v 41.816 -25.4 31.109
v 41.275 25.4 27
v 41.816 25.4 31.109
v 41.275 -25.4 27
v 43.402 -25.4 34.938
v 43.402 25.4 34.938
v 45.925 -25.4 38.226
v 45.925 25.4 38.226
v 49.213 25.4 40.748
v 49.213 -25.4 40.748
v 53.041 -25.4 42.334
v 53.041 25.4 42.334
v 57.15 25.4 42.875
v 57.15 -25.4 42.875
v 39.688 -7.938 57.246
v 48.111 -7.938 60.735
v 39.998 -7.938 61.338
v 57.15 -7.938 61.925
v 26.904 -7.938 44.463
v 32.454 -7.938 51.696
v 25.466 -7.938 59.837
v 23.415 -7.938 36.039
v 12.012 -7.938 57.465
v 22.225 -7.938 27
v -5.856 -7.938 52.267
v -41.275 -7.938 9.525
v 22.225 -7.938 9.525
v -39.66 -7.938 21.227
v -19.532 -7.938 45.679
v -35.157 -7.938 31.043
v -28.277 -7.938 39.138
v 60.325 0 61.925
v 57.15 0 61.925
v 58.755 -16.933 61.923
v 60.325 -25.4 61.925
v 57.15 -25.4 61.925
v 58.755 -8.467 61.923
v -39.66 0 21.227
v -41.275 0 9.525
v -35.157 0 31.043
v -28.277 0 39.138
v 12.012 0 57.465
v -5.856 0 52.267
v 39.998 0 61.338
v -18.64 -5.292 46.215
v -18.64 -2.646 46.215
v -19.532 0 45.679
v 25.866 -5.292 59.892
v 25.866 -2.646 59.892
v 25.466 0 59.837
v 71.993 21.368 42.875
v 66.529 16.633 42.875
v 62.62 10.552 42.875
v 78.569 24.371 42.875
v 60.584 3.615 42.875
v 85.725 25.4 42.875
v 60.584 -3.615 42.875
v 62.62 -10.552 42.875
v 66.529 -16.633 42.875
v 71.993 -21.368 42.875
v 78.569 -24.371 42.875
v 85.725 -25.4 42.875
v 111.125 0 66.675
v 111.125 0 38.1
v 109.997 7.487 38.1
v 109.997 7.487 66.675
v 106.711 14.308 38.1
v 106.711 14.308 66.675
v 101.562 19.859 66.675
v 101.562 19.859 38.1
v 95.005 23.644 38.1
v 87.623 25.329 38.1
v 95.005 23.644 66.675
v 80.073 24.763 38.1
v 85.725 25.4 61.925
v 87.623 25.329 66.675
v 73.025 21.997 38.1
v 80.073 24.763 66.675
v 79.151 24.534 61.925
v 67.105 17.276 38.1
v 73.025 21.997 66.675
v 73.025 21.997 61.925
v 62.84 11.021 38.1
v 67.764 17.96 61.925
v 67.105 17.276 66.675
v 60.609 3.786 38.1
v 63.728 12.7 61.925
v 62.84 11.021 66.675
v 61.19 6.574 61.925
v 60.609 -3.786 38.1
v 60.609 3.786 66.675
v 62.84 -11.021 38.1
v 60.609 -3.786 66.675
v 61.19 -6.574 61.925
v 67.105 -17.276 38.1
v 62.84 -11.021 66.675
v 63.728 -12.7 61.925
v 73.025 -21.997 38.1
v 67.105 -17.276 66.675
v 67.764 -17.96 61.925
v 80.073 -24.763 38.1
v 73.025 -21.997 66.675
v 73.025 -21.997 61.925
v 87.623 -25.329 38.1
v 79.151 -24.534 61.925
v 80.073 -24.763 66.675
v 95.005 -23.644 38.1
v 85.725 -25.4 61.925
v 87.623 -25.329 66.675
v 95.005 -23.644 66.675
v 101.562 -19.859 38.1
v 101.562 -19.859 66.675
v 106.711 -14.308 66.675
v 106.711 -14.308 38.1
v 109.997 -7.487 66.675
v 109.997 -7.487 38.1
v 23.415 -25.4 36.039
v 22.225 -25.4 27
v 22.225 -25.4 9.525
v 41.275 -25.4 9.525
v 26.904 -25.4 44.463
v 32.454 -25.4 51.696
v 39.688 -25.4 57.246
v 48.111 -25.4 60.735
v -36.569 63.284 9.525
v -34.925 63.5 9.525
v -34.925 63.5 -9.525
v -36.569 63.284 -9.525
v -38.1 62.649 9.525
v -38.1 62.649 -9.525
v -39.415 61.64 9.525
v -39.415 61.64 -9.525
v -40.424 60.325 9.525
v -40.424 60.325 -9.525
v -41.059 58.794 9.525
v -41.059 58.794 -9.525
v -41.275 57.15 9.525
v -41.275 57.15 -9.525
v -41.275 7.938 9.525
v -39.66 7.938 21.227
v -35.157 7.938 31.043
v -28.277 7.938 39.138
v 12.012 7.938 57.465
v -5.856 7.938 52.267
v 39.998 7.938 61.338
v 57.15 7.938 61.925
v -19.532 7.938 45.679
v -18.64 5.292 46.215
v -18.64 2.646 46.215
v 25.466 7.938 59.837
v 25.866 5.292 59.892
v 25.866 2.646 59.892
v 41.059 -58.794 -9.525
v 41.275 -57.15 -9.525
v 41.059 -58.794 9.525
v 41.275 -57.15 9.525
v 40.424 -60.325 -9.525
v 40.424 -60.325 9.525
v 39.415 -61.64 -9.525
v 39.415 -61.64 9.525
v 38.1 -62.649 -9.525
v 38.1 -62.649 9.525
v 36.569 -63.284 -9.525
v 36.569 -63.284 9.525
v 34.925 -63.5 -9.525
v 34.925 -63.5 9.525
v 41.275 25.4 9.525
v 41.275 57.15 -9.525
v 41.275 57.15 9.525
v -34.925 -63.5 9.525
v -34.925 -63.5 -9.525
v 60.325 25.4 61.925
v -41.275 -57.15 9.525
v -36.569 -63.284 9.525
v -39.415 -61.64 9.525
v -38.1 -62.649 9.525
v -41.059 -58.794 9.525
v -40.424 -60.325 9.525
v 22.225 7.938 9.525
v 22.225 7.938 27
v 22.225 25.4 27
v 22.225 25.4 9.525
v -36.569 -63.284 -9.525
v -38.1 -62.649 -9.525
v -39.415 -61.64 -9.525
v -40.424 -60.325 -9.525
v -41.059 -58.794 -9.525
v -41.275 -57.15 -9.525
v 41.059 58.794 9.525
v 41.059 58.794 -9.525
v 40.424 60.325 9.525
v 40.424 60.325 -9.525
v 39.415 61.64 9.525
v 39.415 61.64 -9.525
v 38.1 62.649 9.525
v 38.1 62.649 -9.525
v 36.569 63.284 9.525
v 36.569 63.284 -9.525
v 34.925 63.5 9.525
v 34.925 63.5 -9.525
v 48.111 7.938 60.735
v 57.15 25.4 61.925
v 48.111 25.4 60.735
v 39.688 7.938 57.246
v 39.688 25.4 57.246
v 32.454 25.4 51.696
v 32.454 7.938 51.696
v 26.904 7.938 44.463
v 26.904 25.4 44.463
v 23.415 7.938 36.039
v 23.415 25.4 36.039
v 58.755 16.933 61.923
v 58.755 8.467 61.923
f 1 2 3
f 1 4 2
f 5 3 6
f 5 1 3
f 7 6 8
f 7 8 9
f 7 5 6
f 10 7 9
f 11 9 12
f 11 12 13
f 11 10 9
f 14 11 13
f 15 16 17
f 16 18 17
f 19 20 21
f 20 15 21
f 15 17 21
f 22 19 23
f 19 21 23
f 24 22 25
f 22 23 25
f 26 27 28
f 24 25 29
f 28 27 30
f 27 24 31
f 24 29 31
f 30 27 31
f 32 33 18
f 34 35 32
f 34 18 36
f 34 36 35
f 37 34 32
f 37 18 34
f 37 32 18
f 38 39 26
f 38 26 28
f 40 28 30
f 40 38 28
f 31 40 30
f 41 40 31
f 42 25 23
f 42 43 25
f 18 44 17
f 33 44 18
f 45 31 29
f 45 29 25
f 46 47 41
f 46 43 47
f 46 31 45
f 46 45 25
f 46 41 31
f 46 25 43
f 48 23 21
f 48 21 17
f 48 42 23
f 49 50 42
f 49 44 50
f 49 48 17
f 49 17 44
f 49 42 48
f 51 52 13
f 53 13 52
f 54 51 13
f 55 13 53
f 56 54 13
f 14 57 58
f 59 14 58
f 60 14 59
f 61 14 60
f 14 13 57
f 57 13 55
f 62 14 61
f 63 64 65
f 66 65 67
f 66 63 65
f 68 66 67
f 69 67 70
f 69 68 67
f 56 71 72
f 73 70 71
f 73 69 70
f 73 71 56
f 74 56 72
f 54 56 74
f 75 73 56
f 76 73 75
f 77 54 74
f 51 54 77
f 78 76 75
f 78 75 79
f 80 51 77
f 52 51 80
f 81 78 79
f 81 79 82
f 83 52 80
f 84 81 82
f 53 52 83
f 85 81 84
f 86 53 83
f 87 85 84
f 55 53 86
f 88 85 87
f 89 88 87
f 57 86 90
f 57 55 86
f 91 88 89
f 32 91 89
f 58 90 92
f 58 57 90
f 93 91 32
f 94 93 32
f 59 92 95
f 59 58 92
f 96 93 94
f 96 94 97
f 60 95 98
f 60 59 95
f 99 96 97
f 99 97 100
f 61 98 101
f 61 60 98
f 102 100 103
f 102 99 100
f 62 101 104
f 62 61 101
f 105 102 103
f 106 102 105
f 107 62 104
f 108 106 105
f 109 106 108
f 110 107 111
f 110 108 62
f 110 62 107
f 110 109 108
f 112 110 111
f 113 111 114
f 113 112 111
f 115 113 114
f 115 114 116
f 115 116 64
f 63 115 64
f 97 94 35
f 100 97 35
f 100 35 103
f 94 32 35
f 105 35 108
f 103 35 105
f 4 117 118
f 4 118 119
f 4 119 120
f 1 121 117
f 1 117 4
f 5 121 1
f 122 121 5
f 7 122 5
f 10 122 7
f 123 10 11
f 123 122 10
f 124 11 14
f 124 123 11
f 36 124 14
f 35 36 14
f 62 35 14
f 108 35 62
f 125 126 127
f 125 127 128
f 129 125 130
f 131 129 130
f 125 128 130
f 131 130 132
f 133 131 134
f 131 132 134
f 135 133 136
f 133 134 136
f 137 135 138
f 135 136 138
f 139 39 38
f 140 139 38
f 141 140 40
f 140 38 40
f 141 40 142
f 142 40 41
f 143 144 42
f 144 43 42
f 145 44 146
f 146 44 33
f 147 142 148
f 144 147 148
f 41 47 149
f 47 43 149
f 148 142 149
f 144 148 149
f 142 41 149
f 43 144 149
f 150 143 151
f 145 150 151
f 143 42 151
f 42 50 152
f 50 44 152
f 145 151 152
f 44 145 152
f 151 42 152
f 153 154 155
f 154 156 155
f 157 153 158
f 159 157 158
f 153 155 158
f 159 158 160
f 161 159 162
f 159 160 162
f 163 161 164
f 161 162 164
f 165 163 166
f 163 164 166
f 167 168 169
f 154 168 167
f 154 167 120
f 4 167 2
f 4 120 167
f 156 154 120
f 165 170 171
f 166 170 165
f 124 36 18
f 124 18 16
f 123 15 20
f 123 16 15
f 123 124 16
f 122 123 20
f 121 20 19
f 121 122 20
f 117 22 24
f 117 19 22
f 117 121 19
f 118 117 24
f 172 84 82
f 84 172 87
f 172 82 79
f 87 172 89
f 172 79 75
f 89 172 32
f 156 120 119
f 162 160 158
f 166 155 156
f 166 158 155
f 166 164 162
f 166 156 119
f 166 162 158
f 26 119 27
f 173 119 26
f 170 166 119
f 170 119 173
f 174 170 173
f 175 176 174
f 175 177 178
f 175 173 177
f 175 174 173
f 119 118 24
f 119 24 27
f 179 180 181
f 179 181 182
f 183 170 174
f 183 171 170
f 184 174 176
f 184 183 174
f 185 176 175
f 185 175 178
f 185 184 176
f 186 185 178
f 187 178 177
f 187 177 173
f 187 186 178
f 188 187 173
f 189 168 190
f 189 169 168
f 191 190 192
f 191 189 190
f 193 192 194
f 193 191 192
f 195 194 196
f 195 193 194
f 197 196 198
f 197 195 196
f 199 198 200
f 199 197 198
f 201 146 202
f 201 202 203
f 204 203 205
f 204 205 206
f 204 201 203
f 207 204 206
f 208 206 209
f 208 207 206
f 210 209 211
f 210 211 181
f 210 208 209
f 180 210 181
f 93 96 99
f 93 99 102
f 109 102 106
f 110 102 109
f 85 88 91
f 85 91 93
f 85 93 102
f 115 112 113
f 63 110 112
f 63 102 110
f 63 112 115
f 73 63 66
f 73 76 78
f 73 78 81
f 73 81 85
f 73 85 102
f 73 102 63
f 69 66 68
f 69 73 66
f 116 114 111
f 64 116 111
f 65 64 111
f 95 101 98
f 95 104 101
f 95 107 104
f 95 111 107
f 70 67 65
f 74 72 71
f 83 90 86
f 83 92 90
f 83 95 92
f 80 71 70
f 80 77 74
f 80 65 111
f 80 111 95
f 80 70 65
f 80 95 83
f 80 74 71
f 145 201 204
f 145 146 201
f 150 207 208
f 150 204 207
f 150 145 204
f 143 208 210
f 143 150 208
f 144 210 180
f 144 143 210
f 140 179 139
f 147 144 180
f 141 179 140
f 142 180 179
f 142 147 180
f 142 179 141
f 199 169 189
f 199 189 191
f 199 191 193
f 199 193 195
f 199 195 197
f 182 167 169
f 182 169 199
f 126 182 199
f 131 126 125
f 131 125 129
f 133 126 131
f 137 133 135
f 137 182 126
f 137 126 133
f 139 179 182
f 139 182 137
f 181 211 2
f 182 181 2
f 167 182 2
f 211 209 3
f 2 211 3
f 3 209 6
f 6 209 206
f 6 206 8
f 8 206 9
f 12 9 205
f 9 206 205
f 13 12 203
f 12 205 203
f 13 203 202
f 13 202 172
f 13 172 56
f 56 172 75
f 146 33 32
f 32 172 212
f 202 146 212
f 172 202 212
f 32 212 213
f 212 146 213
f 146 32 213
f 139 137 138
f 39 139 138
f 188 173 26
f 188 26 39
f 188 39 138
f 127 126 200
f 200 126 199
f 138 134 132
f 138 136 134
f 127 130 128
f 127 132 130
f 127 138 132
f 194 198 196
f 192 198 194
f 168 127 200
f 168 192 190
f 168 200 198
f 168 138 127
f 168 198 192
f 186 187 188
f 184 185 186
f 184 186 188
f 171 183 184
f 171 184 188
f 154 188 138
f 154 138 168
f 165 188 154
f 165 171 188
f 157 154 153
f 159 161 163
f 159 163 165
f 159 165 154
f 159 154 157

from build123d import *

# Parameters (mm, degrees)
F1_DEPTH = 63.5
F0_W     = 25.3999010601
F0_H     = 19.05
F2_DEPTH = 25.4
F3_DEPTH = 7.9375
F5_R     = 6.35


# Not quite as in the source:
# - ends of sketch curves that miss each other by under 0.0002 mm in the source are joined


with BuildPart() as f1:
    # F0 (on Front) → F1 (new body, symmetric)
    with BuildSketch(Plane.XZ):
        Polygon((22.225, 9.525), (-41.275, 9.525), (-41.275, -9.525), (41.275, -9.525), (41.275, 9.525), align=None)
    extrude(amount=F1_DEPTH, both=True)

    # F0 (on Front) → F2 (join, symmetric)
    with BuildSketch(Plane.XZ):
        with Locations((73.0249505301, 52.4002)):
            Rectangle(F0_W, F0_H)
        with BuildLine():
            Line((22.225, 27.0002), (22.225, 9.5249091869))
            Line((22.225, 9.5249091869), (41.275, 9.525))
            Line((41.275, 9.525), (41.275, 27.0002))
            ThreePointArc((41.275, 27.0002), (45.9246798487, 38.2255201513), (57.15, 42.8752))
            Line((57.15, 42.8752), (60.325, 42.8752))
            Line((60.325, 42.8752), (60.325, 61.9252))
            add(Edge.make_bspline(
                [(57.15, 61.9252), (59.3391618347, 61.9252), (59.4645664096, 61.9133971632), (60.325, 61.9252)],
                knots=[0.8556201459, 0.8556201459, 0.8556201459, 0.8556201459, 1, 1, 1, 1], degree=3))
            ThreePointArc((57.15, 61.9252), (32.4542956671, 51.6959043329), (22.225, 27.0002))
        make_face()
    extrude(amount=F2_DEPTH, both=True)

    # F0 (on Front) → F3 (join, symmetric)
    with BuildSketch(Plane.XZ):
        with BuildLine():
            add(Edge.make_bspline(
                [(-41.275, 9.525), (-41.2749116122, 61.5106898116), (44.1766459292, 61.9252), (57.15, 61.9252)],
                knots=[0, 0, 0, 0, 0.8556201459, 0.8556201459, 0.8556201459, 0.8556201459], degree=3))
            Line((-41.275, 9.525), (22.225, 9.525))
            Line((22.225, 9.525), (22.225, 27.0002))
            ThreePointArc((22.225, 27.0002), (32.4542956671, 51.6959043329), (57.15, 61.9252))
        make_face()
    extrude(amount=F3_DEPTH, both=True)

    # F0 (on Front) → F4 (revolve)
    with BuildSketch(Plane.XZ):
        Polygon((85.725, 66.675), (85.725, 61.9252), (85.725, 42.8752), (85.725, 38.1), (111.125, 38.1), (111.125, 66.675), align=None)
    revolve(axis=Axis((85.725, 0, 52.3875), (0, 0, 1)))

    # F5
    f5_edges = [f1.edges().sort_by_distance(p)[0] for p in [
        (41.275, -63.5, 0),
        (-41.275, -63.5, 0),
        (41.275, 63.5, 0),
        (-41.275, 63.5, 0),
    ]]
    fillet(f5_edges, radius=F5_R)


solid = f1.part
